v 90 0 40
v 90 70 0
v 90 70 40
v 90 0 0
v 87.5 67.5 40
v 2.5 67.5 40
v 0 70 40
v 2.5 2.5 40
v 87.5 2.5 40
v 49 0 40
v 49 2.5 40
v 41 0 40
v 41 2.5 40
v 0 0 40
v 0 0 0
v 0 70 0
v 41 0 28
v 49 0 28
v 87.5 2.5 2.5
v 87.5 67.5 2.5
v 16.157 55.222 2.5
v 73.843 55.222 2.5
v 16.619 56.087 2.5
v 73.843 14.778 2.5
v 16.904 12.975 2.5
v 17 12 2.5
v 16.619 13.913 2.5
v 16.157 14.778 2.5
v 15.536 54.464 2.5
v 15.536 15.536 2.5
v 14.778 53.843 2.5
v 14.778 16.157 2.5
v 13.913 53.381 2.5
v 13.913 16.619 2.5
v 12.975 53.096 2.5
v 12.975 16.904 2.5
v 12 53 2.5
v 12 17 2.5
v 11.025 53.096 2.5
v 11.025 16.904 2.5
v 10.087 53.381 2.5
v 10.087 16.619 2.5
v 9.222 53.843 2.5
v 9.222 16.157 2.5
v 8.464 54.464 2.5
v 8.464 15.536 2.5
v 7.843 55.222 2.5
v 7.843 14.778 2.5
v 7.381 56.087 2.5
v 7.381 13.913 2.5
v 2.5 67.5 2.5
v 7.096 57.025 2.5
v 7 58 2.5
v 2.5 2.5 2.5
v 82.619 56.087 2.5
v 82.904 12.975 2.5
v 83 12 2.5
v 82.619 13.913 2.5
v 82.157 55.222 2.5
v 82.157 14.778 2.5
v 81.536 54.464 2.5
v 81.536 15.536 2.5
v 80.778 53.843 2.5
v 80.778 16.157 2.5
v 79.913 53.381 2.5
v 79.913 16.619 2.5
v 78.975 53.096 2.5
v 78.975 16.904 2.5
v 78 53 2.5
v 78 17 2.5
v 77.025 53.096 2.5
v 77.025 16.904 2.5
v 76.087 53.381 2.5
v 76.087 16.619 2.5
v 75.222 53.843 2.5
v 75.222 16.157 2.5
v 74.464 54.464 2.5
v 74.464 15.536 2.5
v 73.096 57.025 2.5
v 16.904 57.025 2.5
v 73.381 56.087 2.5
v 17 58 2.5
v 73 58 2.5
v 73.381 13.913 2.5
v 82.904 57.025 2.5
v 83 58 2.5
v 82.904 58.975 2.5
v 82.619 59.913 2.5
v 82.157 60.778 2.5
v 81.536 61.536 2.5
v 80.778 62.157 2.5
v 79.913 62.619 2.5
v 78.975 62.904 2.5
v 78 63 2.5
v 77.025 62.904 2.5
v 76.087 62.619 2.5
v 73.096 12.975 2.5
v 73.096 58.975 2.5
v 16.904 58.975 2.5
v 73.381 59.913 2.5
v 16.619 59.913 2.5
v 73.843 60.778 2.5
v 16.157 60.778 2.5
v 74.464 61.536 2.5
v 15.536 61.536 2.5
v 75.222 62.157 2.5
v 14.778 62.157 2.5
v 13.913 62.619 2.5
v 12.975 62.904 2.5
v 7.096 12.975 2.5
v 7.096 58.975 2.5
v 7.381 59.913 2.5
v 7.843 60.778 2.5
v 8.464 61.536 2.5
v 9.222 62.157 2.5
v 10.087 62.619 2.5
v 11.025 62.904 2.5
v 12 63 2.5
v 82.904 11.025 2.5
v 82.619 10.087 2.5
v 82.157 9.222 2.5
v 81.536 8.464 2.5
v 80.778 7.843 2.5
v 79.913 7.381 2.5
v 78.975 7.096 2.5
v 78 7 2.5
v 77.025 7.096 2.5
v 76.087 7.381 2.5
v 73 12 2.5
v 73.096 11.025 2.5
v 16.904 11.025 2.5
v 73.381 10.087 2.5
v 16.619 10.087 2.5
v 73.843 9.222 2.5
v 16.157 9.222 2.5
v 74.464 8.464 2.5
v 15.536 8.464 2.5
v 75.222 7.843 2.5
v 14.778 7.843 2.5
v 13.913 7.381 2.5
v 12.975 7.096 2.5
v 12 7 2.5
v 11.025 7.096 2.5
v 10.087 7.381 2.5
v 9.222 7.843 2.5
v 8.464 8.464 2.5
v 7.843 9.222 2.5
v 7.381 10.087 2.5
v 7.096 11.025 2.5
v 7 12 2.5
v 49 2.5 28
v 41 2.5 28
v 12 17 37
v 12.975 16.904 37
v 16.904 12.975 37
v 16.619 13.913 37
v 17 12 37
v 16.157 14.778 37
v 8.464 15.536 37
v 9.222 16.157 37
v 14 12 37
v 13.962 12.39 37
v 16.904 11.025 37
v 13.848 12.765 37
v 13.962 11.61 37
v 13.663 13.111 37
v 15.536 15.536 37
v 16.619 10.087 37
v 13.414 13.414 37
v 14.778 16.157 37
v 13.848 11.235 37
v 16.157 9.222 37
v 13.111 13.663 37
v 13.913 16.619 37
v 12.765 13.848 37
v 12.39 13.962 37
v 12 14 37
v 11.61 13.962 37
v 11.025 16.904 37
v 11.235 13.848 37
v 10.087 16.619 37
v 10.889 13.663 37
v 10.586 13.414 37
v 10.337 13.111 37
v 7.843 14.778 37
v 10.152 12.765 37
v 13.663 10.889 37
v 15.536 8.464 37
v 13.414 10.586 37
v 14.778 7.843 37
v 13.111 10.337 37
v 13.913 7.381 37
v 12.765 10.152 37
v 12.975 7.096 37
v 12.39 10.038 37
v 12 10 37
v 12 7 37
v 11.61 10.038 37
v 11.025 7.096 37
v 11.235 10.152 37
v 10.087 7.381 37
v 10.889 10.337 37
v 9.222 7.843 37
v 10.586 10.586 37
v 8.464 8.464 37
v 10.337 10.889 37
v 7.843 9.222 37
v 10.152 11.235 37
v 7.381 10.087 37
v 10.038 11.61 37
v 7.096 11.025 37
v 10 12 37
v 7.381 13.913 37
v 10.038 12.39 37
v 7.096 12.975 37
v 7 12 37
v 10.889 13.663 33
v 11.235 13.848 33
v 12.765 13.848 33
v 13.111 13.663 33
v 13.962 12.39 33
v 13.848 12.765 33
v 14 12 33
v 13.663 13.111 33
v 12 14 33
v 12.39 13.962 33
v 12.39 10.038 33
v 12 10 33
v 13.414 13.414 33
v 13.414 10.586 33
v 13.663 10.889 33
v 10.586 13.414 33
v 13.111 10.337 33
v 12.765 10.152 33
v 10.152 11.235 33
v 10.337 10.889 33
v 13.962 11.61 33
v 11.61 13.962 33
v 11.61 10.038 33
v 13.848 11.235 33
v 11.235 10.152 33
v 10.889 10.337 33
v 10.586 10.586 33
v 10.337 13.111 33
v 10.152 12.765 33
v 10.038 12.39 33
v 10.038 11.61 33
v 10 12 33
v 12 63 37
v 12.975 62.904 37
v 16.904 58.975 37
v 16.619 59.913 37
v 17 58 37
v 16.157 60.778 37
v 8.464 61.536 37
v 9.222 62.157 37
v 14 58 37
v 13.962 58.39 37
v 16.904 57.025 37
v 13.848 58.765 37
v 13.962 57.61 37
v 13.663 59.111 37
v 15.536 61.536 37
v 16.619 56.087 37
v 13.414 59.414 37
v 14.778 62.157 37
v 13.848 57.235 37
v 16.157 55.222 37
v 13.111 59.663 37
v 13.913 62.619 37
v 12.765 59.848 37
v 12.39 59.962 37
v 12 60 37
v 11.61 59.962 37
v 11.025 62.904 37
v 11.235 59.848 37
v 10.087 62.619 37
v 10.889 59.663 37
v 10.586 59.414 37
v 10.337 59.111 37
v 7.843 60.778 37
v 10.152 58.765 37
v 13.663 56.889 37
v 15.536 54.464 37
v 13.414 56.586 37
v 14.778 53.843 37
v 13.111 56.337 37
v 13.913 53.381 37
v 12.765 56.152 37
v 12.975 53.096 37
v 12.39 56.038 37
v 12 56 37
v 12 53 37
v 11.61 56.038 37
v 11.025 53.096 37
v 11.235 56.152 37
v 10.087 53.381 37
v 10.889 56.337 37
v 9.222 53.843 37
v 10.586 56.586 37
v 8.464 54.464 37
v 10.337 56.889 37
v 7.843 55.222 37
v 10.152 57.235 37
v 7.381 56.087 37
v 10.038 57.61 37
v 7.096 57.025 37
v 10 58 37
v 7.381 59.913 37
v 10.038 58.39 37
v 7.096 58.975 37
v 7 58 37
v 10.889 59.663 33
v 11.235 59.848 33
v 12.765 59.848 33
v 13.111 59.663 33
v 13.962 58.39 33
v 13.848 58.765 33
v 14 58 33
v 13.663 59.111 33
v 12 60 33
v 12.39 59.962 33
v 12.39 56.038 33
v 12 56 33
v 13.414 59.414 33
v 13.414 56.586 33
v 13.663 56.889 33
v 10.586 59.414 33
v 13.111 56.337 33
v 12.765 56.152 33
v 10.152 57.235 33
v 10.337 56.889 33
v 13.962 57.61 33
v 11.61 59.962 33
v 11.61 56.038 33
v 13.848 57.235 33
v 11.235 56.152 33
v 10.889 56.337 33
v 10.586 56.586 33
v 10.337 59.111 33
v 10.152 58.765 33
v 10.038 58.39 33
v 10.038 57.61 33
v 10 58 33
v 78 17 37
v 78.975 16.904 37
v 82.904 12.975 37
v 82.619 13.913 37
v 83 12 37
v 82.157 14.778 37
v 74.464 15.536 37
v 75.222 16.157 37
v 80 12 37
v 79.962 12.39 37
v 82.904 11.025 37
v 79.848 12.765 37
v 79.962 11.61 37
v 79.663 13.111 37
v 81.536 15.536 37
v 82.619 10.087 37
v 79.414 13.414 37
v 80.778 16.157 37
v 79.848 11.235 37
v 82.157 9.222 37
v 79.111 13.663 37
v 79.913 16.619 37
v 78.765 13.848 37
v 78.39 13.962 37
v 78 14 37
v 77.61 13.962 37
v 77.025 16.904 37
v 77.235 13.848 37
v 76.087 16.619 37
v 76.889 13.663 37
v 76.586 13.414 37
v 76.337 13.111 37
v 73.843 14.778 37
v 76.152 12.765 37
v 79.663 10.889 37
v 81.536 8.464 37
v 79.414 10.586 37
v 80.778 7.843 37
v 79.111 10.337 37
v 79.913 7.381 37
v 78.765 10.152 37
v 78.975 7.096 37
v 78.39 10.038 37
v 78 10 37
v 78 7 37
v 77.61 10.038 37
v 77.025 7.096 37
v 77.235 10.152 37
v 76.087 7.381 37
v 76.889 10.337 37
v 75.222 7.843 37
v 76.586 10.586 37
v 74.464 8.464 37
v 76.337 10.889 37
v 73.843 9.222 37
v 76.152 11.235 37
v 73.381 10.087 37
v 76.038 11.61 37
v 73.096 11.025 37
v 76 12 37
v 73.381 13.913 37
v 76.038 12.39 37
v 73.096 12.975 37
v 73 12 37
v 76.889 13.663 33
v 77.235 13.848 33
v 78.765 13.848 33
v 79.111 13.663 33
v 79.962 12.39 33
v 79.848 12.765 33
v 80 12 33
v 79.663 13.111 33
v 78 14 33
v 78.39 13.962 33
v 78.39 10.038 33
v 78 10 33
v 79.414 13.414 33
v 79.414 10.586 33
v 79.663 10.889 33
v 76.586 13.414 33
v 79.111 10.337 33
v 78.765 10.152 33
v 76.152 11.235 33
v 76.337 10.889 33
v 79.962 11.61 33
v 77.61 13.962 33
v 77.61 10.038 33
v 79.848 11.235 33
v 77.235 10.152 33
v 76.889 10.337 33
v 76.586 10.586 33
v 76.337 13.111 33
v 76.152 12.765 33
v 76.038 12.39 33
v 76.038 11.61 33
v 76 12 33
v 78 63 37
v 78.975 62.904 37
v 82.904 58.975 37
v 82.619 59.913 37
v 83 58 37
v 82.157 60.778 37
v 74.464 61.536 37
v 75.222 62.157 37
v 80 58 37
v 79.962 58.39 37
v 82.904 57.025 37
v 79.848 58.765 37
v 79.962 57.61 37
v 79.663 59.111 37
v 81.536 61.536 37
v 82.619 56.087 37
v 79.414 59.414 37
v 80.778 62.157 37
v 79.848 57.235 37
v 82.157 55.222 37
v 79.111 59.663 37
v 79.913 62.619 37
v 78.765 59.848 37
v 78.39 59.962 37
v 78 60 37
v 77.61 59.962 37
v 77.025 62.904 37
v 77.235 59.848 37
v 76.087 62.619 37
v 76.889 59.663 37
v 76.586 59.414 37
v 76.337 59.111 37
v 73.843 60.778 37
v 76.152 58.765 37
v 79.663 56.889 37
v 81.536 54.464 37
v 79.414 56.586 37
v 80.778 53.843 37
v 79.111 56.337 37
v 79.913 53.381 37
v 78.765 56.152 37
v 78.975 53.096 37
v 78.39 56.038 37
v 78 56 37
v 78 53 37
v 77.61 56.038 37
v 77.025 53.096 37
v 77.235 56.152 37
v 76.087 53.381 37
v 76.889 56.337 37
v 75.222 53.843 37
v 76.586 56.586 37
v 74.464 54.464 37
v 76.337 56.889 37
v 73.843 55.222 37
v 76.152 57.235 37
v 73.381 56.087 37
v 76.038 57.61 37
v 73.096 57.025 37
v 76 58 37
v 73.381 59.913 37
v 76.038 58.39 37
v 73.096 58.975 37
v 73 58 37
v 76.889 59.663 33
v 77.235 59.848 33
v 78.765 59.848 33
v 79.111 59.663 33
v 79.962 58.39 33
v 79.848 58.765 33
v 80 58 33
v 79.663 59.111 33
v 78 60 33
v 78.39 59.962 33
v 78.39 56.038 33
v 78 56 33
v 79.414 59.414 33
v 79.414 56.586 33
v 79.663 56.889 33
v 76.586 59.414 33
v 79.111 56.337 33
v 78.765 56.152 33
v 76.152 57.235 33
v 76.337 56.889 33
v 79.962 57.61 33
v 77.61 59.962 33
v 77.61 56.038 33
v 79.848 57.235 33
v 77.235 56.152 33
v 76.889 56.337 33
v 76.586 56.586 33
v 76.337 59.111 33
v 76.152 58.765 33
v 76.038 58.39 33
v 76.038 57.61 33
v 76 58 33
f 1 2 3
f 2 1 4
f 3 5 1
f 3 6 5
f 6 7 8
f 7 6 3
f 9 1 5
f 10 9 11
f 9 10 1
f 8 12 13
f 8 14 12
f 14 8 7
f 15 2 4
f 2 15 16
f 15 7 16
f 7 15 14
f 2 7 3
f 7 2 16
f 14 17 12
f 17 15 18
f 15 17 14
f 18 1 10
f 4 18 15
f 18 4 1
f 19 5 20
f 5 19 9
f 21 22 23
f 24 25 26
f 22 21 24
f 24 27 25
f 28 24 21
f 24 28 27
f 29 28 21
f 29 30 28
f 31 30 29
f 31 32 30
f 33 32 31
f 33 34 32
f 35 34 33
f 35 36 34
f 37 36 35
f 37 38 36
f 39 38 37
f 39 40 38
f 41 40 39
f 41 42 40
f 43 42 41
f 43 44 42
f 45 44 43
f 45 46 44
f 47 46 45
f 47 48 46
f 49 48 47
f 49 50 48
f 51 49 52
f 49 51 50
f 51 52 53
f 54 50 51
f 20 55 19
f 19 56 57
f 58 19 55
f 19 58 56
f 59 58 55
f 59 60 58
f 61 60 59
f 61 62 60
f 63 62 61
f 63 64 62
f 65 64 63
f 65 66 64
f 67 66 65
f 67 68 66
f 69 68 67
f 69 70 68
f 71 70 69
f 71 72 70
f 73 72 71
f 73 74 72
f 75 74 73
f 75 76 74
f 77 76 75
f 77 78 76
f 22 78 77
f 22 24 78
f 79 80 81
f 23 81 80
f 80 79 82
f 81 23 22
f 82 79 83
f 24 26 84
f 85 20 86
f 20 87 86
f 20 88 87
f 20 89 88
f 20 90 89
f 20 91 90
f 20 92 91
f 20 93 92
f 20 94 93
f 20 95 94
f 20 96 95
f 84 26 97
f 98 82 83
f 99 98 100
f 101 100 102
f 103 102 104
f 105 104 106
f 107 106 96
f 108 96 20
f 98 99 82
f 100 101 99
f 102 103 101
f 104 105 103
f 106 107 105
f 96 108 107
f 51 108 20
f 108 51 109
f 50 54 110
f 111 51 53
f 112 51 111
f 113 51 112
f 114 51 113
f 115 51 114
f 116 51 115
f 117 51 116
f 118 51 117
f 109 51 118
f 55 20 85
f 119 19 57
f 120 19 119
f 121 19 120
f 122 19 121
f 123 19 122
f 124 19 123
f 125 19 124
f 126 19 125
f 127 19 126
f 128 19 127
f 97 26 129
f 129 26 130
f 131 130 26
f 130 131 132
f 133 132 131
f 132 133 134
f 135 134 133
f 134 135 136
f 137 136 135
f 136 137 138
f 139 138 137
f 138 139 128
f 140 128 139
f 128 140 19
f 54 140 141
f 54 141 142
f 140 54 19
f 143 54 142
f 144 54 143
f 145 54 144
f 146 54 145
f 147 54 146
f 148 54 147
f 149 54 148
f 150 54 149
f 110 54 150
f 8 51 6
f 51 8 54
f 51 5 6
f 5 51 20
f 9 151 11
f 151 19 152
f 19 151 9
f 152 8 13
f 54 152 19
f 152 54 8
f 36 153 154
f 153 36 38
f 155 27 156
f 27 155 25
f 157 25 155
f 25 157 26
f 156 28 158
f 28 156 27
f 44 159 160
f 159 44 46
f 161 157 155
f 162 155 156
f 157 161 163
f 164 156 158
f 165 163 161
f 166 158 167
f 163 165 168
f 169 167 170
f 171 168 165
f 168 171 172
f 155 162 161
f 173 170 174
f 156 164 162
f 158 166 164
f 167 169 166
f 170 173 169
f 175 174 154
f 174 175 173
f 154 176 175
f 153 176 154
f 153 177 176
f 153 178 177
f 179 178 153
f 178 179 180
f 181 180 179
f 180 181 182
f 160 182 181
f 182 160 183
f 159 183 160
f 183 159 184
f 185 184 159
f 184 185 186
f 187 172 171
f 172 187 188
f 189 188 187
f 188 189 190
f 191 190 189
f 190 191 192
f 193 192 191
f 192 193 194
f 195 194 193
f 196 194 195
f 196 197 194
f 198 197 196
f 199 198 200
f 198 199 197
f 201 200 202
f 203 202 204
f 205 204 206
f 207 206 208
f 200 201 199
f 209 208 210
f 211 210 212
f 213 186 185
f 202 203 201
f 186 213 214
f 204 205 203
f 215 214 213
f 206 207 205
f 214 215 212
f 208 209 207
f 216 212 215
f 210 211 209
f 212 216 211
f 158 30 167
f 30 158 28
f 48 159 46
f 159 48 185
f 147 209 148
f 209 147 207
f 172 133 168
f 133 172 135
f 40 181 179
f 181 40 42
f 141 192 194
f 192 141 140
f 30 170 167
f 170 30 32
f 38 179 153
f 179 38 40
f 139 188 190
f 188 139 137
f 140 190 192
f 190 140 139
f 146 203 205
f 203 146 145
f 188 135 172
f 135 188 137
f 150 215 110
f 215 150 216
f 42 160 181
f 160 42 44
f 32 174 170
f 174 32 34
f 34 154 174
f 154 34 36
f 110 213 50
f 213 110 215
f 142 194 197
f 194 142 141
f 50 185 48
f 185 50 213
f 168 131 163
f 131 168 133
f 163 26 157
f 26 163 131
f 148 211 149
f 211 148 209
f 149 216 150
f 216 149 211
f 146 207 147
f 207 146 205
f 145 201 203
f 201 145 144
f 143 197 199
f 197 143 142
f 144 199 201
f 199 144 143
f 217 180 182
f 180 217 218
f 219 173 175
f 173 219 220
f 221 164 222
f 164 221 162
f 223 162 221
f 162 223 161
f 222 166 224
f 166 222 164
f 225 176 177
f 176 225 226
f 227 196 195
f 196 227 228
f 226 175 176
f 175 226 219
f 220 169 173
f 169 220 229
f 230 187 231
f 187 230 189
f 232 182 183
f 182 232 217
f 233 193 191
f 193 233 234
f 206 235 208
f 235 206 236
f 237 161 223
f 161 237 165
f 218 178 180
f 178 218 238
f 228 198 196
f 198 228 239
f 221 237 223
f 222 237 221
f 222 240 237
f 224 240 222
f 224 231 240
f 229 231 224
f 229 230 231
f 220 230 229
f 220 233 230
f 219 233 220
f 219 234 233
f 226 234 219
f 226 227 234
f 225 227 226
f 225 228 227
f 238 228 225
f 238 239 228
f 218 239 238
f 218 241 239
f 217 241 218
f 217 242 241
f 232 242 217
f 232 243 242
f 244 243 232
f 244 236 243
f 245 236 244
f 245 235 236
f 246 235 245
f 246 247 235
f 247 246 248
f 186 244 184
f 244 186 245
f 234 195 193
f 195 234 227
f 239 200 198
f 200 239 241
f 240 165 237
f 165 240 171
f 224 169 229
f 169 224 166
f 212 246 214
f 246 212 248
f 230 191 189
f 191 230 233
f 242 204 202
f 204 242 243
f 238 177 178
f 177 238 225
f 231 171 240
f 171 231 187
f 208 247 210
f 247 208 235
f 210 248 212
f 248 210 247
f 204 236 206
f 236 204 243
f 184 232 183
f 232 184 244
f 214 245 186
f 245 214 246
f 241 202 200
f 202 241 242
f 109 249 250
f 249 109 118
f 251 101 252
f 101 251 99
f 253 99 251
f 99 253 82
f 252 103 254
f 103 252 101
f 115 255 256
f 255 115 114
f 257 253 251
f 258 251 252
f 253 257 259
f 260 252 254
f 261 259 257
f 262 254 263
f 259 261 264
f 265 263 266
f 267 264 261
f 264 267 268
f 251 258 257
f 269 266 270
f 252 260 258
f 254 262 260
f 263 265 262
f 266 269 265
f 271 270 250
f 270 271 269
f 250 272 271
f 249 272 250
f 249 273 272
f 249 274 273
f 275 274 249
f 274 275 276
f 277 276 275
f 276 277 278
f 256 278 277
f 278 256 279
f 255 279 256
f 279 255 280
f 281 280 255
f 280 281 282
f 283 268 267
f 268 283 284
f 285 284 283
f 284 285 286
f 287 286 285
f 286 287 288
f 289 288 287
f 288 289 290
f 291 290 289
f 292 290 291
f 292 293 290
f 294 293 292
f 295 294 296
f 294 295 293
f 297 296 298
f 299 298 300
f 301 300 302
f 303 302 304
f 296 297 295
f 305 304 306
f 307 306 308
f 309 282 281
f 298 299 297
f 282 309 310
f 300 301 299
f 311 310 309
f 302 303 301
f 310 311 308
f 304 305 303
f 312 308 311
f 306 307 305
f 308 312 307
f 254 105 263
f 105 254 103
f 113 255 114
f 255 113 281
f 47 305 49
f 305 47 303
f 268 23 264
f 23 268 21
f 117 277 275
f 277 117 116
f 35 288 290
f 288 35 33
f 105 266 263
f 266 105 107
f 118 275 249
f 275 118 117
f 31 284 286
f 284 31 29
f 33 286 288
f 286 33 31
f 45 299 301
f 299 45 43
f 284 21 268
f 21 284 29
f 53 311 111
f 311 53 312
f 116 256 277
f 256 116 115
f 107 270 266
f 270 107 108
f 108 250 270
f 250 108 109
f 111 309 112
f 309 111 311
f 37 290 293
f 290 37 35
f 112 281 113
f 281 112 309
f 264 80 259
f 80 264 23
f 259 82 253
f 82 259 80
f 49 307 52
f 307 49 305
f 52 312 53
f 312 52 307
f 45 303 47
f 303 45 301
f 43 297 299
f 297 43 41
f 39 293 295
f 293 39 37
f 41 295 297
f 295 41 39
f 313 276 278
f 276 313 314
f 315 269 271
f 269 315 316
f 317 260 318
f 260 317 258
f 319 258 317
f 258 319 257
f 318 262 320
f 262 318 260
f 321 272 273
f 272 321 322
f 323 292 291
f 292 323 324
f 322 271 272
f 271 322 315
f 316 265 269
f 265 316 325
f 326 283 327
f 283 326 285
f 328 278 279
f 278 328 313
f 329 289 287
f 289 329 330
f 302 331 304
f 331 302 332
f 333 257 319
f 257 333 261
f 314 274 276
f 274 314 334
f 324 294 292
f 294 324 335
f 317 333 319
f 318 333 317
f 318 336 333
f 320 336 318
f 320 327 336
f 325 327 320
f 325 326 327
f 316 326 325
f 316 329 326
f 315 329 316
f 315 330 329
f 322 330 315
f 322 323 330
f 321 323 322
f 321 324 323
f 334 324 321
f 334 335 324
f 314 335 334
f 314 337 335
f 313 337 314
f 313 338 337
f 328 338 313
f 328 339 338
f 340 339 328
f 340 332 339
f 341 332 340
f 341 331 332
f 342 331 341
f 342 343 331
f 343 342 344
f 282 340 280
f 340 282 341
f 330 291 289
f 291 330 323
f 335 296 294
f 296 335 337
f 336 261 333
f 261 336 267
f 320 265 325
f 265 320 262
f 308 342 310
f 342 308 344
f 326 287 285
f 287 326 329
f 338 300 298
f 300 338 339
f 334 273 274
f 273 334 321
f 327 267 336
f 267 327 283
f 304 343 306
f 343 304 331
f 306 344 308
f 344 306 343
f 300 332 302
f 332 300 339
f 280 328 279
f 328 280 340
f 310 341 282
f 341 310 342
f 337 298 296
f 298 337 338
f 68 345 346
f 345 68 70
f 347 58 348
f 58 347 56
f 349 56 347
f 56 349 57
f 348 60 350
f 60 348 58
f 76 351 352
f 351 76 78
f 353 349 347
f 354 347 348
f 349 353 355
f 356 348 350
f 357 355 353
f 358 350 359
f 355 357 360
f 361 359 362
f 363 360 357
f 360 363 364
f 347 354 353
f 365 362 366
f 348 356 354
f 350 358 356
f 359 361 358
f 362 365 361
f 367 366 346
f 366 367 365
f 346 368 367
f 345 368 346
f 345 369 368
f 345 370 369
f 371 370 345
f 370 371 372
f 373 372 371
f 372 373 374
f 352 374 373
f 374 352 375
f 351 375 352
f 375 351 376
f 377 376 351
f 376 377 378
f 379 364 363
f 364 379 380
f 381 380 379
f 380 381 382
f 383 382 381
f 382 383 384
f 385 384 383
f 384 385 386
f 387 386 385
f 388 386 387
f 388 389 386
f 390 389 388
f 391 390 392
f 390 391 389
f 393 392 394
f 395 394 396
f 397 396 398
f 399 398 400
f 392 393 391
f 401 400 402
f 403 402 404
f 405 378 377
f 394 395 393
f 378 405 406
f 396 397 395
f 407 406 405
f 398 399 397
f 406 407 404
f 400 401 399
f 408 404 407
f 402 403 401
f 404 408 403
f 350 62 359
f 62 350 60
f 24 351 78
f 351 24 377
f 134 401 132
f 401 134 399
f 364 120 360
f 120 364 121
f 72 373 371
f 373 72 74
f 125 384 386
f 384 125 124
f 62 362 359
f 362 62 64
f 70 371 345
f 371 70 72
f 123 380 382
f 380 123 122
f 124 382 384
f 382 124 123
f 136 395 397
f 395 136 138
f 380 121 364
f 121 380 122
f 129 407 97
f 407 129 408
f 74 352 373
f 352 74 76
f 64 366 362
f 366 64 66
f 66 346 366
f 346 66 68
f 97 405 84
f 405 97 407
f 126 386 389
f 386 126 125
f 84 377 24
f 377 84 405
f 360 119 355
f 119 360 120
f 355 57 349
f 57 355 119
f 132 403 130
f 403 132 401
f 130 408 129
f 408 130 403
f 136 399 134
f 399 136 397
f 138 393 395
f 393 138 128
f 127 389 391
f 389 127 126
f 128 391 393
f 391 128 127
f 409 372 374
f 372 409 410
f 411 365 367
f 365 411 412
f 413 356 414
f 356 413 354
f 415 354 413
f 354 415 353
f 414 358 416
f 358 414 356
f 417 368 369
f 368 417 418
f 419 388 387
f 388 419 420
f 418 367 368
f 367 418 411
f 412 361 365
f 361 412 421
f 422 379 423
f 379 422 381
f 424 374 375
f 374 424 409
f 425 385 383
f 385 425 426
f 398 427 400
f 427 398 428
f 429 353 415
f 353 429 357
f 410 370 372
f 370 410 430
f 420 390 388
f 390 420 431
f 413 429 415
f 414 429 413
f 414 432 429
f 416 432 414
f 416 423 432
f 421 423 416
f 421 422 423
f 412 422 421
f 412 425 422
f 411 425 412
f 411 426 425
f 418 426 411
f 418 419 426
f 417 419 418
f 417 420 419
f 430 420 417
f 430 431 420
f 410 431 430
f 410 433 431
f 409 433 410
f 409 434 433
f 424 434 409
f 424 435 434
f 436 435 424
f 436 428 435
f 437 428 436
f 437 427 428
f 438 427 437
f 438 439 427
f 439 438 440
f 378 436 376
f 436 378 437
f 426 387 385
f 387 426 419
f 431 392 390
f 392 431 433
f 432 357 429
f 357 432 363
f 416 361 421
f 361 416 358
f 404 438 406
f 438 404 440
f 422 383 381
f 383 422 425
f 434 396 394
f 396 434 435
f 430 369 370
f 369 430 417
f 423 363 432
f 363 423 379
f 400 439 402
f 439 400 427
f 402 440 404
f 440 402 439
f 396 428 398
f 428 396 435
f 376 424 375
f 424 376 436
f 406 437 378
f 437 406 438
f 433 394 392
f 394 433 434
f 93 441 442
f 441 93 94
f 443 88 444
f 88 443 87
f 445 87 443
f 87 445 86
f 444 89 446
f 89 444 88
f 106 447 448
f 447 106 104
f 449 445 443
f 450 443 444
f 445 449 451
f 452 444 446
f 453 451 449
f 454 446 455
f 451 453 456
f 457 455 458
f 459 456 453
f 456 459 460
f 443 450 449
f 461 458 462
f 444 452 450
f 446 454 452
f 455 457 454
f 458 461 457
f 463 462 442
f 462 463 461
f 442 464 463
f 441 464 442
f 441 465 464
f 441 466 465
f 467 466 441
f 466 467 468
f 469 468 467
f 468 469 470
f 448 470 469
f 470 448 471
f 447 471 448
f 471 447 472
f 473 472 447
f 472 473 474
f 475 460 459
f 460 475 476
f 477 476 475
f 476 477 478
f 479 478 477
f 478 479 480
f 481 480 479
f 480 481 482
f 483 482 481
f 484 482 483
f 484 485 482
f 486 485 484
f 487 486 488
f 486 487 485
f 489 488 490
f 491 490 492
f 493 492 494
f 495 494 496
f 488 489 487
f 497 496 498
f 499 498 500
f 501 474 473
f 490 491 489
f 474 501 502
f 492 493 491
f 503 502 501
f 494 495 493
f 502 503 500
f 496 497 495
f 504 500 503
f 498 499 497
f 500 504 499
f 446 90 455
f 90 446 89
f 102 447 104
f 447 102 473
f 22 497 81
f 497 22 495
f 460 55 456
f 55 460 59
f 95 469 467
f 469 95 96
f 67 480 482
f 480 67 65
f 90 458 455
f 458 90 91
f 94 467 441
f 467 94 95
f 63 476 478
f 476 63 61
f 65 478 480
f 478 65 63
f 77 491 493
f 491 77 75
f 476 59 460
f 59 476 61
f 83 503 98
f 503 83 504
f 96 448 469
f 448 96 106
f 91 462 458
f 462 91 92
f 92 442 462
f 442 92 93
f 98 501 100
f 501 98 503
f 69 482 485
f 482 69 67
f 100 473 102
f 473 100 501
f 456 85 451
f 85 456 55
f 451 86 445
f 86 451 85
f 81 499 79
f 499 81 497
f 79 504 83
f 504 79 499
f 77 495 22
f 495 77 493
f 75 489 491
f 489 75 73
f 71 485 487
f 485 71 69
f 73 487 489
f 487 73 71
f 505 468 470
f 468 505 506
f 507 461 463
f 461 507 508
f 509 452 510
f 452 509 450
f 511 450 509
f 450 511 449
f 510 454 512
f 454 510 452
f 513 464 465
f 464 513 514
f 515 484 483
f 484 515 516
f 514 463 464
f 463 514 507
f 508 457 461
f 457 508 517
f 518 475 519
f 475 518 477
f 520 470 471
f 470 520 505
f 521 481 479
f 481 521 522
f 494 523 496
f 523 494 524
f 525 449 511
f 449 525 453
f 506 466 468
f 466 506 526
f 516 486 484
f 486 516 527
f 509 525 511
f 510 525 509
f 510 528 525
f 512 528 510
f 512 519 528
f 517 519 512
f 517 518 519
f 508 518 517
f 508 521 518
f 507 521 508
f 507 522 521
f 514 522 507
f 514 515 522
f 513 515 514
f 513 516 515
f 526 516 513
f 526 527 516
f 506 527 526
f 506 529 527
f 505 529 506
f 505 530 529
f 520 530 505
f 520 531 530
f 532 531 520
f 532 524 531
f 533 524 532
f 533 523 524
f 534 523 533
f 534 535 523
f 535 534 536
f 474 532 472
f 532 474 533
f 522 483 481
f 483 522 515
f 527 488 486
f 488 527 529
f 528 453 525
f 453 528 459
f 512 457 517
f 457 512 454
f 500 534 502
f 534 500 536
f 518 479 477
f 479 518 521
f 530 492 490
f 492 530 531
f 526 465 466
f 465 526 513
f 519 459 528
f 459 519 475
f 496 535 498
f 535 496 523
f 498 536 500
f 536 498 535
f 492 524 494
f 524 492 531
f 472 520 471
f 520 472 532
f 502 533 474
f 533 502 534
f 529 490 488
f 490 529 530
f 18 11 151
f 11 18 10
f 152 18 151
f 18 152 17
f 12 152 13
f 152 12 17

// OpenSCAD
$fn = 32;

// ----------------------------------------------------------------------
// Enclosure box: both enclosure
// ----------------------------------------------------------------------

// --- parameters (mm) ---
box_l = 90;               // outer length, X
box_w = 70;               // outer width, Y
box_h = 40;               // outer height
wall_t = 2.5;             // wall thickness
boss_r = 5;               // corner boss radius
hole_r = 2;               // boss screw hole radius
boss_in = 12;             // boss inset from the corners
notch_w = 8;              // cable notch width
notch_h = 12;             // cable notch height

inner_h = box_h - wall_t;  // cavity depth
boss_h = inner_h - 2;  // corner boss height

difference() {
  union() {
    difference() {
      cube([box_l, box_w, box_h]);
      translate([wall_t, wall_t, wall_t])
        cube([box_l - 2 * wall_t, box_w - 2 * wall_t, box_h]);
    }
    for (sx = [0, 1], sy = [0, 1])
      translate([sx ? box_l - boss_in : boss_in,
                 sy ? box_w - boss_in : boss_in, wall_t - 1])
        difference() {
          cylinder(r = boss_r, h = boss_h);
          translate([0, 0, boss_h - 4])
            cylinder(r = hole_r, h = 5);
        }
  }
  translate([box_l / 2 - notch_w / 2, -1, box_h - notch_h])
    cube([notch_w, wall_t + 2, notch_h + 1]);
}
